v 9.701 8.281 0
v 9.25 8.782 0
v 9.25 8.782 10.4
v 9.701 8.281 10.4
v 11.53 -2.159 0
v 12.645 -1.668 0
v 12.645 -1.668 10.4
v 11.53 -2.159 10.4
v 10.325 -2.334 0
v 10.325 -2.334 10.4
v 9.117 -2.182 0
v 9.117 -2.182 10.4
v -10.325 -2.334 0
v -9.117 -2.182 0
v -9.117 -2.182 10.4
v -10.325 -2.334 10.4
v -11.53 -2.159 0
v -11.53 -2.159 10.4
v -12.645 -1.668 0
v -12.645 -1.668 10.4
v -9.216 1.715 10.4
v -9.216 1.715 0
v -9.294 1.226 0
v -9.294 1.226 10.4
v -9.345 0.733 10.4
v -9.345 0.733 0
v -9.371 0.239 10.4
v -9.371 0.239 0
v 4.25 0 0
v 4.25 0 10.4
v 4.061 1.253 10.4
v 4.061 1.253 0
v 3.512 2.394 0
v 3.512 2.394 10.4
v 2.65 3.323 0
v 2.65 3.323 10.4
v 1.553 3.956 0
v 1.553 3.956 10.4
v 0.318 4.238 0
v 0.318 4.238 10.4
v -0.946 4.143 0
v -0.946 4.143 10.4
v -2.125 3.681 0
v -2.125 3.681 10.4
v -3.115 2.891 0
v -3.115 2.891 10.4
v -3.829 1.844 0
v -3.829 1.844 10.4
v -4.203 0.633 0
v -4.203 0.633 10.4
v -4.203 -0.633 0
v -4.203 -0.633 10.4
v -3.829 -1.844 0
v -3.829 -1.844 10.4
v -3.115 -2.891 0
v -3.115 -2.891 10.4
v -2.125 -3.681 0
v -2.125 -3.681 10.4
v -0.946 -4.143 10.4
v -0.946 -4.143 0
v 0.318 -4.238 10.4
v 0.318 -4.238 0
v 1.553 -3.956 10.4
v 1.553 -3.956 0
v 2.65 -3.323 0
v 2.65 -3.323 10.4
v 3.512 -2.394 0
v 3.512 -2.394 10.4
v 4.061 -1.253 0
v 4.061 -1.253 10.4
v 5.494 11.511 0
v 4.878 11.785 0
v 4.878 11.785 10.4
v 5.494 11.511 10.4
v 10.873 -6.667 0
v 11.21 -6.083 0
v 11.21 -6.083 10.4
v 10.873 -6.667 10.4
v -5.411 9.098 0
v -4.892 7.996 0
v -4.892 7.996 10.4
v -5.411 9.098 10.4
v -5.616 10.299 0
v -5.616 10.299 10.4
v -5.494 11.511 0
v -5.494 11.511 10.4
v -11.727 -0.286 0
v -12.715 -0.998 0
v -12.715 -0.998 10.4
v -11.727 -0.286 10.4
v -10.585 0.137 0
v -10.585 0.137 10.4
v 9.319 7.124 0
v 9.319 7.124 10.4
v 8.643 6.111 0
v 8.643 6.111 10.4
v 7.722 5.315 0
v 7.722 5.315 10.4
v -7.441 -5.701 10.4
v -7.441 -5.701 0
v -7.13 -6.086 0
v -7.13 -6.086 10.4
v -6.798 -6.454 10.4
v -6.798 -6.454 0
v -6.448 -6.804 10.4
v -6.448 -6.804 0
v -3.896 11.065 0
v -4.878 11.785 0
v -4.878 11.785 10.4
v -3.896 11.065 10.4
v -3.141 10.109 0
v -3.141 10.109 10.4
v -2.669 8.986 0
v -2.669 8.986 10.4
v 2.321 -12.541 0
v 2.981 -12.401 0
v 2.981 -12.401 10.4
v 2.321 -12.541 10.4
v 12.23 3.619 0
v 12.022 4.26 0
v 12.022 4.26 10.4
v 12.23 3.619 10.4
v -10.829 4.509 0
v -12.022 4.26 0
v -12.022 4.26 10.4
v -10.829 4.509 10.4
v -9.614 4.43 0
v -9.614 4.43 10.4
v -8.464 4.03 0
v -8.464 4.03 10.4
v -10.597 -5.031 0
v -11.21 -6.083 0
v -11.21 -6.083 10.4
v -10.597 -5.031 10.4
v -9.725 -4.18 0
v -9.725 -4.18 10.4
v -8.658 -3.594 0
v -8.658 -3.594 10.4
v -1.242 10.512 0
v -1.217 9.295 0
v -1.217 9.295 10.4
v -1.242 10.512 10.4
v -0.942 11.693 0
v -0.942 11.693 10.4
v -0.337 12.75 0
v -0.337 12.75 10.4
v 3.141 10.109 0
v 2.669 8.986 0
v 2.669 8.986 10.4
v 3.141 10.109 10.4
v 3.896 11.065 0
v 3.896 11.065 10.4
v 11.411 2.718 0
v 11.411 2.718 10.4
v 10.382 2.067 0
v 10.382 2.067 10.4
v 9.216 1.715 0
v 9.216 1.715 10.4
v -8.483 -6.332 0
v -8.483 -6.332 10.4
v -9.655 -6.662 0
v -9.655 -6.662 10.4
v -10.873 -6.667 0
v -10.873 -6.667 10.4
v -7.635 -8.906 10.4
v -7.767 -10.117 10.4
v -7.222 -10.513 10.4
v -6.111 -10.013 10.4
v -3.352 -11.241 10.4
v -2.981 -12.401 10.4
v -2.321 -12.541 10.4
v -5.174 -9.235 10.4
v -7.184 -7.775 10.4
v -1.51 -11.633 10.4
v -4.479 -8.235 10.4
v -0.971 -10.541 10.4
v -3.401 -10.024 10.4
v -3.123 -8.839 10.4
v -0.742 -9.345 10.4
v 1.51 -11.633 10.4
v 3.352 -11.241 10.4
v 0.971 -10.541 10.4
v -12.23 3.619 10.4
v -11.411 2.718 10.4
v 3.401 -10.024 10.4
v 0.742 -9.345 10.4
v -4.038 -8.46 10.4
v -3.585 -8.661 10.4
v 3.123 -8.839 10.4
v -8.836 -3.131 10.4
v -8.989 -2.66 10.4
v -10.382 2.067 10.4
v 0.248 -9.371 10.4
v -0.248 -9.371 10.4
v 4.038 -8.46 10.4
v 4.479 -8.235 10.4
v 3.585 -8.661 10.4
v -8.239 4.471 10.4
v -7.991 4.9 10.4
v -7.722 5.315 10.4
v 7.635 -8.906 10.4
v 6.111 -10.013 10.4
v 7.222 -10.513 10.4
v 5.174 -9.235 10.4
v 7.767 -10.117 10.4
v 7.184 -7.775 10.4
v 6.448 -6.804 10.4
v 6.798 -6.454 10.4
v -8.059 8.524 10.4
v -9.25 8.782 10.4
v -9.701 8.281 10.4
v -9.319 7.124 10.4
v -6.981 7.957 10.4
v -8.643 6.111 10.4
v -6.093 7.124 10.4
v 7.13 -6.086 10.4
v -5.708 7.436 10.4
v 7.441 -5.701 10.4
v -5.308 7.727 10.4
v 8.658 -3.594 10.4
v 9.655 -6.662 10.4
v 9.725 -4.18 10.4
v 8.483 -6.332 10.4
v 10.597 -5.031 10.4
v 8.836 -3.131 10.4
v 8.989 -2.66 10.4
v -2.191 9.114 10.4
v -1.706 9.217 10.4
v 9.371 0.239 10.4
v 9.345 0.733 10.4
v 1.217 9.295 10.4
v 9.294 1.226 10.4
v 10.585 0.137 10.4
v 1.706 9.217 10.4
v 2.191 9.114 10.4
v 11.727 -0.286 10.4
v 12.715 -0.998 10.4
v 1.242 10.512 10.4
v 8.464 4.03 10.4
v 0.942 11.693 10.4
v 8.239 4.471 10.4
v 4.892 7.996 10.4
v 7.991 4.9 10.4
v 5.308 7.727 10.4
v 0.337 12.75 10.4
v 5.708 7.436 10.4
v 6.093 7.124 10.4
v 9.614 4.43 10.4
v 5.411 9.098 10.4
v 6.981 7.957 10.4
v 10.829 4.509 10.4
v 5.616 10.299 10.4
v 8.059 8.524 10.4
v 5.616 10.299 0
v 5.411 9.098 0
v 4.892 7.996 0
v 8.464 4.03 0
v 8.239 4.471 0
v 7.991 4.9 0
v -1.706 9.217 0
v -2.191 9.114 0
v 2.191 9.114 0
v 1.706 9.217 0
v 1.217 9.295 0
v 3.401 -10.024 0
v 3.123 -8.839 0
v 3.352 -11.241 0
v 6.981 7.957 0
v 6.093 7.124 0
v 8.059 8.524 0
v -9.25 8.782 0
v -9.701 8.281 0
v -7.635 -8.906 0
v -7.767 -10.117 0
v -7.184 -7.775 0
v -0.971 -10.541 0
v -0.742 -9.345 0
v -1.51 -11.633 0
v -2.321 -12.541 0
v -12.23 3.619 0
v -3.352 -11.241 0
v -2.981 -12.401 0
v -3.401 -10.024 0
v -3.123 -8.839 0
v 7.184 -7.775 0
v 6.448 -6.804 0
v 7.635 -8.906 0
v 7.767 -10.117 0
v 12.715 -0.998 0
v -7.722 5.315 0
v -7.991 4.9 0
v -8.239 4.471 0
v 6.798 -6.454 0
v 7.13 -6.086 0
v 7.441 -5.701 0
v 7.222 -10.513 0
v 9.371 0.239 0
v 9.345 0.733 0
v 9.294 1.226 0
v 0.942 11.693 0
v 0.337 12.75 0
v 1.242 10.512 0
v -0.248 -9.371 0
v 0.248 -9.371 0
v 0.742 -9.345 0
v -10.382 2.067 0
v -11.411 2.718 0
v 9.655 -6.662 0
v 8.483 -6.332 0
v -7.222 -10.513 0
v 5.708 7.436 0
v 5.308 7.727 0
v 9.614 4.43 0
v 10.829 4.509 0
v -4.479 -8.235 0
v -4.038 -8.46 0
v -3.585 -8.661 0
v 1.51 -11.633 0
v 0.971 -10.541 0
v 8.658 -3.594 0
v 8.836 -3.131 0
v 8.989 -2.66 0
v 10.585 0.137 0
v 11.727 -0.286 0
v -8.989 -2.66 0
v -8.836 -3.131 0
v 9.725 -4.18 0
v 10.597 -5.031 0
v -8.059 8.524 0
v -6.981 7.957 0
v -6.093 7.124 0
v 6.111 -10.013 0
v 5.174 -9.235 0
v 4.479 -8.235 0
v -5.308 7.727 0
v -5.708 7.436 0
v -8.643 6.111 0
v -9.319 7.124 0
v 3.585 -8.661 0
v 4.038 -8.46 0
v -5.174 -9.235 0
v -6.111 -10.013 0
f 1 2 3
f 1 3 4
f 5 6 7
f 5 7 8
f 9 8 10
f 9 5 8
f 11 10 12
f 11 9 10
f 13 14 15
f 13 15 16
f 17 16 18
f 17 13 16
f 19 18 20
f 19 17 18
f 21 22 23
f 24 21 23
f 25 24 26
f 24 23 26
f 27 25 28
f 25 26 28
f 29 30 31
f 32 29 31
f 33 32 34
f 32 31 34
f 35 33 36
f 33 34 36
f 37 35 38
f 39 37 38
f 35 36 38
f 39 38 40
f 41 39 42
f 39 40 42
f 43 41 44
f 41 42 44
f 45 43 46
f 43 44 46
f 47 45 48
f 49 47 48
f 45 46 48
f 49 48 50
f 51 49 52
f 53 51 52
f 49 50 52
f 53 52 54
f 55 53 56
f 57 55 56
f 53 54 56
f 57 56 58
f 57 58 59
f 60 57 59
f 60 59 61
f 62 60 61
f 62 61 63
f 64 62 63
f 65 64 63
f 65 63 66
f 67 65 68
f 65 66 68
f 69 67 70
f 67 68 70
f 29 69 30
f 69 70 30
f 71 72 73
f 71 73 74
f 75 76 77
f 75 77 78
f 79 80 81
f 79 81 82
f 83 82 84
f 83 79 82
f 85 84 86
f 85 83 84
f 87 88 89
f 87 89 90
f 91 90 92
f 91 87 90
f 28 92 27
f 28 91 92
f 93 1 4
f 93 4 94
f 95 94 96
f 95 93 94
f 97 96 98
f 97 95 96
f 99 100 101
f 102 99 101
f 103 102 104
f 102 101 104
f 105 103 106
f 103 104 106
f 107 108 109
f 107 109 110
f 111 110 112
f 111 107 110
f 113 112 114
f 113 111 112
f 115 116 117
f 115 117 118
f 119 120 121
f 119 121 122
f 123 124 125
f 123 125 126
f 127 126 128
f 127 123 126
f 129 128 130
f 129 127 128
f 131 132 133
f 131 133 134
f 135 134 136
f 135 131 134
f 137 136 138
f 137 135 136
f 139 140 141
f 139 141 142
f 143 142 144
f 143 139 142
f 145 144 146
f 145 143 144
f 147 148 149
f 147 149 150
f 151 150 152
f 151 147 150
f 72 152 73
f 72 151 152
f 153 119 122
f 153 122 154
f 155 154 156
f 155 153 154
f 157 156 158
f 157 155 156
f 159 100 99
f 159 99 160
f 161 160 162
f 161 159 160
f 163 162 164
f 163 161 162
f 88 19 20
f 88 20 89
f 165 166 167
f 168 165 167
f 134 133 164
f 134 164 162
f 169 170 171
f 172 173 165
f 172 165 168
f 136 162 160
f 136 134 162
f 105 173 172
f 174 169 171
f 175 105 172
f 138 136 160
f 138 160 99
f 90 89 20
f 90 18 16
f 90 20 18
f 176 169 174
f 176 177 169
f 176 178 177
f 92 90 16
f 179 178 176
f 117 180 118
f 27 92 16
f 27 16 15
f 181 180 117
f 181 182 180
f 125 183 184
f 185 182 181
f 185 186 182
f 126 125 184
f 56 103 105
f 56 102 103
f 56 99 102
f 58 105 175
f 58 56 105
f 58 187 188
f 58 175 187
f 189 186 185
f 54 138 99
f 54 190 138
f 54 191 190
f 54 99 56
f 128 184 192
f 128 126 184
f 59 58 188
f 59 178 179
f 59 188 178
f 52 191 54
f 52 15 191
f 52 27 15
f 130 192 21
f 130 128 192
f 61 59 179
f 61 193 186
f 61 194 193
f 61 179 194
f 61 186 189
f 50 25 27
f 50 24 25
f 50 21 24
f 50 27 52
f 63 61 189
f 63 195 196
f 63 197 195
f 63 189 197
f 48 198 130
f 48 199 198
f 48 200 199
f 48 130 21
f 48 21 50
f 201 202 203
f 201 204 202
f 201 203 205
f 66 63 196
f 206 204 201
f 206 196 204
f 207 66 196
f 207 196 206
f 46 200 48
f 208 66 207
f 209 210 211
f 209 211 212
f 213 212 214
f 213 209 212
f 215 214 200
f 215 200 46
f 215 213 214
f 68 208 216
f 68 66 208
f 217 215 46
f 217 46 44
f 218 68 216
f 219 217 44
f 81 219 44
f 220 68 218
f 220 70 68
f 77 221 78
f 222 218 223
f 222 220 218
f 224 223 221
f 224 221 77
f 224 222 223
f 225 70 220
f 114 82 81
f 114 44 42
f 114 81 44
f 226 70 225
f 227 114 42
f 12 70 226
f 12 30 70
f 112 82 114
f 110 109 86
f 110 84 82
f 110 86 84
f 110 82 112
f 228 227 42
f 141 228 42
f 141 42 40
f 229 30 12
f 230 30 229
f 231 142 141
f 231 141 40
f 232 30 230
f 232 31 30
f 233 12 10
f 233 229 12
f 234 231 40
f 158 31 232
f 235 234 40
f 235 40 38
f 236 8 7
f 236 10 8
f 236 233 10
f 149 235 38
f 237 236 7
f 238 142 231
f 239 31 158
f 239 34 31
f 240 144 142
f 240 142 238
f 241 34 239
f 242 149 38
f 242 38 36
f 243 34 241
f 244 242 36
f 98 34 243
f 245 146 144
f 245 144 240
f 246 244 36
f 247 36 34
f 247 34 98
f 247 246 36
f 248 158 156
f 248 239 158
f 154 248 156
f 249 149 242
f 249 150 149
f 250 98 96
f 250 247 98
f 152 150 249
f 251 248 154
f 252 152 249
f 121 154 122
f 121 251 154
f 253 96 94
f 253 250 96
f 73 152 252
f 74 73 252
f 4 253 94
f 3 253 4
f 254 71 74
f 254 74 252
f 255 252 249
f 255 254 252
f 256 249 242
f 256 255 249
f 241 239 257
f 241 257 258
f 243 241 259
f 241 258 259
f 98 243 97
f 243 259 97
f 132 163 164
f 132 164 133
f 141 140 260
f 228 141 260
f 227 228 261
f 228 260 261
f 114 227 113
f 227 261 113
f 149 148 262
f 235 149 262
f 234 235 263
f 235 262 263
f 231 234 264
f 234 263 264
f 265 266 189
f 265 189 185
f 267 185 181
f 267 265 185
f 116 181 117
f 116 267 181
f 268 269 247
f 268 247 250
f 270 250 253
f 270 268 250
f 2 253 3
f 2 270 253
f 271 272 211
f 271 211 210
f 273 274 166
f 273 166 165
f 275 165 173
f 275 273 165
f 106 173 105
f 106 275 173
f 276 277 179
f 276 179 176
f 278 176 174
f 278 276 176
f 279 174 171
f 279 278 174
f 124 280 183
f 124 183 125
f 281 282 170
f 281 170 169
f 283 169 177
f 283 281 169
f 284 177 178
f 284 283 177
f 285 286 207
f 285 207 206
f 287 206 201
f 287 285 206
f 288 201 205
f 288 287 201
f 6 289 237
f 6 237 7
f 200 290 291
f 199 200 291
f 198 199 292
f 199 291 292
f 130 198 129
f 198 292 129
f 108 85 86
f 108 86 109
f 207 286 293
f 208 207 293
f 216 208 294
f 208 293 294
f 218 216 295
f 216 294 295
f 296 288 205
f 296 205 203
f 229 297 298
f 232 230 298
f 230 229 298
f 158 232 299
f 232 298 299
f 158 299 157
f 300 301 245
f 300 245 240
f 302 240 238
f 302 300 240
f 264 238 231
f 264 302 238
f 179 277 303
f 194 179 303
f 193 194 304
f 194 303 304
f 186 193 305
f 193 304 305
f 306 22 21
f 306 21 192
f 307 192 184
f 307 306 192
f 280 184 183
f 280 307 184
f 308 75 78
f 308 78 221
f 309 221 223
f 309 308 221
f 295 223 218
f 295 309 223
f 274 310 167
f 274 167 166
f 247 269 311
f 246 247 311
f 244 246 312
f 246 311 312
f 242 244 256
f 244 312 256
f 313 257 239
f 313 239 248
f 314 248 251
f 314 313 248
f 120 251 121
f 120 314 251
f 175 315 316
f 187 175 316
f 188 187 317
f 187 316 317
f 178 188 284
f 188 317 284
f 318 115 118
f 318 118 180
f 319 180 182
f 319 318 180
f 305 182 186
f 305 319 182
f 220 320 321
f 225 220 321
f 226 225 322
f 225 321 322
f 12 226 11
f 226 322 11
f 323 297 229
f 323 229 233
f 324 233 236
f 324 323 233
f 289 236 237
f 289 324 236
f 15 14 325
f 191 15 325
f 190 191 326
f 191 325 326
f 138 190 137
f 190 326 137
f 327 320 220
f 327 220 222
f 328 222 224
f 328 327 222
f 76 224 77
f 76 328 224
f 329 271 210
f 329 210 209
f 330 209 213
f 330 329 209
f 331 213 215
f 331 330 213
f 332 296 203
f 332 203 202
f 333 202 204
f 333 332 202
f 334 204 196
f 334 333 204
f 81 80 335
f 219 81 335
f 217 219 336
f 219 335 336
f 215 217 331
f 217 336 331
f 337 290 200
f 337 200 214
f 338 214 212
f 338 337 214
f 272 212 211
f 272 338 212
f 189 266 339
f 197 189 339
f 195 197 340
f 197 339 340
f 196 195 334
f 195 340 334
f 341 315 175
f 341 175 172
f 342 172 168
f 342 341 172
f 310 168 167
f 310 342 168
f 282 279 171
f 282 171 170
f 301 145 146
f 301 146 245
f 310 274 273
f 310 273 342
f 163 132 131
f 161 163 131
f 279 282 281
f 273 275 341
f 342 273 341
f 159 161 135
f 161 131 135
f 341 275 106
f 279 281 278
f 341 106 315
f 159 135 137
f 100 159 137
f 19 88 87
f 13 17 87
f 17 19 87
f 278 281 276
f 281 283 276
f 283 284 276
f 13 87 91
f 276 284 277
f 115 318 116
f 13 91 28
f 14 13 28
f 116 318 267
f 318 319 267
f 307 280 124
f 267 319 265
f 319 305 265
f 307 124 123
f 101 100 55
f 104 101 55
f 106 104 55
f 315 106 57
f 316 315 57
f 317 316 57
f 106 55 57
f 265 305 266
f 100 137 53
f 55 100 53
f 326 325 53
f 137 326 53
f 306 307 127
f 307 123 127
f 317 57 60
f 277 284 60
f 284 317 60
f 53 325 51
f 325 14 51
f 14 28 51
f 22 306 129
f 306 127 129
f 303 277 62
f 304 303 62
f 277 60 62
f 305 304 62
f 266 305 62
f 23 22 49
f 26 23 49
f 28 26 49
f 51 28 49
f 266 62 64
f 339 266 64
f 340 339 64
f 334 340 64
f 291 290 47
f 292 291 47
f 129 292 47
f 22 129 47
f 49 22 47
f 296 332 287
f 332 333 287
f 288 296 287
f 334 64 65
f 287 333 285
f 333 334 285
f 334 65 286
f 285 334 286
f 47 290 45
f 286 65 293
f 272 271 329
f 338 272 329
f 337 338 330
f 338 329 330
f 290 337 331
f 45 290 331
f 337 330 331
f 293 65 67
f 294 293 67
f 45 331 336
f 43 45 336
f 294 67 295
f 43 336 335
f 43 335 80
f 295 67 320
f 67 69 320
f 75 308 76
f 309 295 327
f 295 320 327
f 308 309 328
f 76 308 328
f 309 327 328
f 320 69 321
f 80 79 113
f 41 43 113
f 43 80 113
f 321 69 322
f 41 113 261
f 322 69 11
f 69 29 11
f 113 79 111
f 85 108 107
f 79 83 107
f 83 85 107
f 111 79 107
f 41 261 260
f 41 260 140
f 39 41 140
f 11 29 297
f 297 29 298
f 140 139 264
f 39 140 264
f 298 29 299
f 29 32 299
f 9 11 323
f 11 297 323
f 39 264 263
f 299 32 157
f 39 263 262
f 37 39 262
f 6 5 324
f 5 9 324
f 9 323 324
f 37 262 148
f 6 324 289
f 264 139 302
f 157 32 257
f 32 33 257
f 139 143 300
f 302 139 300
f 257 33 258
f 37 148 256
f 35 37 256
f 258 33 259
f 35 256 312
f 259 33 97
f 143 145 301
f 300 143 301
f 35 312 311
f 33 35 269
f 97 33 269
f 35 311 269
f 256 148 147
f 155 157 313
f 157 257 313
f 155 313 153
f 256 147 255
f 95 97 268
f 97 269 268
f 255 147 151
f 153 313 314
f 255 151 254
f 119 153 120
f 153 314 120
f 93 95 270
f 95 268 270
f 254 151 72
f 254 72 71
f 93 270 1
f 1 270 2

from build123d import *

# Parameters (mm, degrees)
ESBO_O1_R                = 9.374
RESSALTO_EXTRUS_O1_DEPTH = 10.4
RESSALTO_EXTRUS_O2_START = -10.4
RESSALTO_EXTRUS_O2_DEPTH = 10.4
PADR_OCIRCULAR1_COUNT    = 15
ESBO_O4_R                = 4.25
CORTE_EXTRUS_O1_DEPTH    = 10.4


with BuildPart() as part:
    # Esboço1 → Ressalto-extrusão1 (new body)
    with BuildSketch(Plane.XY):
        Circle(ESBO_O1_R)
    extrude(amount=RESSALTO_EXTRUS_O1_DEPTH)

    # Esboço2 → Ressalto-extrusão2 (add)
    with BuildSketch(Plane.XY.offset(10.4).offset(RESSALTO_EXTRUS_O2_START)):
        with BuildLine():
            Line((-0.337, 12.75), (0.337, 12.75))
            ThreePointArc((0.337, 12.75), (1.131844214, 11.112718069), (1.216843597, 9.294684915))
            ThreePointArc((1.216843597, 9.294684915), (0, 9.374), (-1.216843597, 9.294684915))
            ThreePointArc((-1.216843597, 9.294684915), (-1.131844214, 11.112718069), (-0.337, 12.75))
        make_face()
    ressalto_extrus_o2 = extrude(amount=RESSALTO_EXTRUS_O2_DEPTH)

    # PadrãoCircular1: Ressalto-extrusão2 ×15 about axis
    padr_ocircular1_axis = Axis((0, 0, 0), (0, 0, 1))
    for i in range(1, PADR_OCIRCULAR1_COUNT):
        add(ressalto_extrus_o2.rotate(padr_ocircular1_axis, i * 360 / PADR_OCIRCULAR1_COUNT))

    # Esboço4 → Corte-extrusão1 (cut)
    with BuildSketch(Plane.XY.offset(10.4)):
        Circle(ESBO_O4_R)
    extrude(amount=-CORTE_EXTRUS_O1_DEPTH, mode=Mode.SUBTRACT)


solid = part.part
